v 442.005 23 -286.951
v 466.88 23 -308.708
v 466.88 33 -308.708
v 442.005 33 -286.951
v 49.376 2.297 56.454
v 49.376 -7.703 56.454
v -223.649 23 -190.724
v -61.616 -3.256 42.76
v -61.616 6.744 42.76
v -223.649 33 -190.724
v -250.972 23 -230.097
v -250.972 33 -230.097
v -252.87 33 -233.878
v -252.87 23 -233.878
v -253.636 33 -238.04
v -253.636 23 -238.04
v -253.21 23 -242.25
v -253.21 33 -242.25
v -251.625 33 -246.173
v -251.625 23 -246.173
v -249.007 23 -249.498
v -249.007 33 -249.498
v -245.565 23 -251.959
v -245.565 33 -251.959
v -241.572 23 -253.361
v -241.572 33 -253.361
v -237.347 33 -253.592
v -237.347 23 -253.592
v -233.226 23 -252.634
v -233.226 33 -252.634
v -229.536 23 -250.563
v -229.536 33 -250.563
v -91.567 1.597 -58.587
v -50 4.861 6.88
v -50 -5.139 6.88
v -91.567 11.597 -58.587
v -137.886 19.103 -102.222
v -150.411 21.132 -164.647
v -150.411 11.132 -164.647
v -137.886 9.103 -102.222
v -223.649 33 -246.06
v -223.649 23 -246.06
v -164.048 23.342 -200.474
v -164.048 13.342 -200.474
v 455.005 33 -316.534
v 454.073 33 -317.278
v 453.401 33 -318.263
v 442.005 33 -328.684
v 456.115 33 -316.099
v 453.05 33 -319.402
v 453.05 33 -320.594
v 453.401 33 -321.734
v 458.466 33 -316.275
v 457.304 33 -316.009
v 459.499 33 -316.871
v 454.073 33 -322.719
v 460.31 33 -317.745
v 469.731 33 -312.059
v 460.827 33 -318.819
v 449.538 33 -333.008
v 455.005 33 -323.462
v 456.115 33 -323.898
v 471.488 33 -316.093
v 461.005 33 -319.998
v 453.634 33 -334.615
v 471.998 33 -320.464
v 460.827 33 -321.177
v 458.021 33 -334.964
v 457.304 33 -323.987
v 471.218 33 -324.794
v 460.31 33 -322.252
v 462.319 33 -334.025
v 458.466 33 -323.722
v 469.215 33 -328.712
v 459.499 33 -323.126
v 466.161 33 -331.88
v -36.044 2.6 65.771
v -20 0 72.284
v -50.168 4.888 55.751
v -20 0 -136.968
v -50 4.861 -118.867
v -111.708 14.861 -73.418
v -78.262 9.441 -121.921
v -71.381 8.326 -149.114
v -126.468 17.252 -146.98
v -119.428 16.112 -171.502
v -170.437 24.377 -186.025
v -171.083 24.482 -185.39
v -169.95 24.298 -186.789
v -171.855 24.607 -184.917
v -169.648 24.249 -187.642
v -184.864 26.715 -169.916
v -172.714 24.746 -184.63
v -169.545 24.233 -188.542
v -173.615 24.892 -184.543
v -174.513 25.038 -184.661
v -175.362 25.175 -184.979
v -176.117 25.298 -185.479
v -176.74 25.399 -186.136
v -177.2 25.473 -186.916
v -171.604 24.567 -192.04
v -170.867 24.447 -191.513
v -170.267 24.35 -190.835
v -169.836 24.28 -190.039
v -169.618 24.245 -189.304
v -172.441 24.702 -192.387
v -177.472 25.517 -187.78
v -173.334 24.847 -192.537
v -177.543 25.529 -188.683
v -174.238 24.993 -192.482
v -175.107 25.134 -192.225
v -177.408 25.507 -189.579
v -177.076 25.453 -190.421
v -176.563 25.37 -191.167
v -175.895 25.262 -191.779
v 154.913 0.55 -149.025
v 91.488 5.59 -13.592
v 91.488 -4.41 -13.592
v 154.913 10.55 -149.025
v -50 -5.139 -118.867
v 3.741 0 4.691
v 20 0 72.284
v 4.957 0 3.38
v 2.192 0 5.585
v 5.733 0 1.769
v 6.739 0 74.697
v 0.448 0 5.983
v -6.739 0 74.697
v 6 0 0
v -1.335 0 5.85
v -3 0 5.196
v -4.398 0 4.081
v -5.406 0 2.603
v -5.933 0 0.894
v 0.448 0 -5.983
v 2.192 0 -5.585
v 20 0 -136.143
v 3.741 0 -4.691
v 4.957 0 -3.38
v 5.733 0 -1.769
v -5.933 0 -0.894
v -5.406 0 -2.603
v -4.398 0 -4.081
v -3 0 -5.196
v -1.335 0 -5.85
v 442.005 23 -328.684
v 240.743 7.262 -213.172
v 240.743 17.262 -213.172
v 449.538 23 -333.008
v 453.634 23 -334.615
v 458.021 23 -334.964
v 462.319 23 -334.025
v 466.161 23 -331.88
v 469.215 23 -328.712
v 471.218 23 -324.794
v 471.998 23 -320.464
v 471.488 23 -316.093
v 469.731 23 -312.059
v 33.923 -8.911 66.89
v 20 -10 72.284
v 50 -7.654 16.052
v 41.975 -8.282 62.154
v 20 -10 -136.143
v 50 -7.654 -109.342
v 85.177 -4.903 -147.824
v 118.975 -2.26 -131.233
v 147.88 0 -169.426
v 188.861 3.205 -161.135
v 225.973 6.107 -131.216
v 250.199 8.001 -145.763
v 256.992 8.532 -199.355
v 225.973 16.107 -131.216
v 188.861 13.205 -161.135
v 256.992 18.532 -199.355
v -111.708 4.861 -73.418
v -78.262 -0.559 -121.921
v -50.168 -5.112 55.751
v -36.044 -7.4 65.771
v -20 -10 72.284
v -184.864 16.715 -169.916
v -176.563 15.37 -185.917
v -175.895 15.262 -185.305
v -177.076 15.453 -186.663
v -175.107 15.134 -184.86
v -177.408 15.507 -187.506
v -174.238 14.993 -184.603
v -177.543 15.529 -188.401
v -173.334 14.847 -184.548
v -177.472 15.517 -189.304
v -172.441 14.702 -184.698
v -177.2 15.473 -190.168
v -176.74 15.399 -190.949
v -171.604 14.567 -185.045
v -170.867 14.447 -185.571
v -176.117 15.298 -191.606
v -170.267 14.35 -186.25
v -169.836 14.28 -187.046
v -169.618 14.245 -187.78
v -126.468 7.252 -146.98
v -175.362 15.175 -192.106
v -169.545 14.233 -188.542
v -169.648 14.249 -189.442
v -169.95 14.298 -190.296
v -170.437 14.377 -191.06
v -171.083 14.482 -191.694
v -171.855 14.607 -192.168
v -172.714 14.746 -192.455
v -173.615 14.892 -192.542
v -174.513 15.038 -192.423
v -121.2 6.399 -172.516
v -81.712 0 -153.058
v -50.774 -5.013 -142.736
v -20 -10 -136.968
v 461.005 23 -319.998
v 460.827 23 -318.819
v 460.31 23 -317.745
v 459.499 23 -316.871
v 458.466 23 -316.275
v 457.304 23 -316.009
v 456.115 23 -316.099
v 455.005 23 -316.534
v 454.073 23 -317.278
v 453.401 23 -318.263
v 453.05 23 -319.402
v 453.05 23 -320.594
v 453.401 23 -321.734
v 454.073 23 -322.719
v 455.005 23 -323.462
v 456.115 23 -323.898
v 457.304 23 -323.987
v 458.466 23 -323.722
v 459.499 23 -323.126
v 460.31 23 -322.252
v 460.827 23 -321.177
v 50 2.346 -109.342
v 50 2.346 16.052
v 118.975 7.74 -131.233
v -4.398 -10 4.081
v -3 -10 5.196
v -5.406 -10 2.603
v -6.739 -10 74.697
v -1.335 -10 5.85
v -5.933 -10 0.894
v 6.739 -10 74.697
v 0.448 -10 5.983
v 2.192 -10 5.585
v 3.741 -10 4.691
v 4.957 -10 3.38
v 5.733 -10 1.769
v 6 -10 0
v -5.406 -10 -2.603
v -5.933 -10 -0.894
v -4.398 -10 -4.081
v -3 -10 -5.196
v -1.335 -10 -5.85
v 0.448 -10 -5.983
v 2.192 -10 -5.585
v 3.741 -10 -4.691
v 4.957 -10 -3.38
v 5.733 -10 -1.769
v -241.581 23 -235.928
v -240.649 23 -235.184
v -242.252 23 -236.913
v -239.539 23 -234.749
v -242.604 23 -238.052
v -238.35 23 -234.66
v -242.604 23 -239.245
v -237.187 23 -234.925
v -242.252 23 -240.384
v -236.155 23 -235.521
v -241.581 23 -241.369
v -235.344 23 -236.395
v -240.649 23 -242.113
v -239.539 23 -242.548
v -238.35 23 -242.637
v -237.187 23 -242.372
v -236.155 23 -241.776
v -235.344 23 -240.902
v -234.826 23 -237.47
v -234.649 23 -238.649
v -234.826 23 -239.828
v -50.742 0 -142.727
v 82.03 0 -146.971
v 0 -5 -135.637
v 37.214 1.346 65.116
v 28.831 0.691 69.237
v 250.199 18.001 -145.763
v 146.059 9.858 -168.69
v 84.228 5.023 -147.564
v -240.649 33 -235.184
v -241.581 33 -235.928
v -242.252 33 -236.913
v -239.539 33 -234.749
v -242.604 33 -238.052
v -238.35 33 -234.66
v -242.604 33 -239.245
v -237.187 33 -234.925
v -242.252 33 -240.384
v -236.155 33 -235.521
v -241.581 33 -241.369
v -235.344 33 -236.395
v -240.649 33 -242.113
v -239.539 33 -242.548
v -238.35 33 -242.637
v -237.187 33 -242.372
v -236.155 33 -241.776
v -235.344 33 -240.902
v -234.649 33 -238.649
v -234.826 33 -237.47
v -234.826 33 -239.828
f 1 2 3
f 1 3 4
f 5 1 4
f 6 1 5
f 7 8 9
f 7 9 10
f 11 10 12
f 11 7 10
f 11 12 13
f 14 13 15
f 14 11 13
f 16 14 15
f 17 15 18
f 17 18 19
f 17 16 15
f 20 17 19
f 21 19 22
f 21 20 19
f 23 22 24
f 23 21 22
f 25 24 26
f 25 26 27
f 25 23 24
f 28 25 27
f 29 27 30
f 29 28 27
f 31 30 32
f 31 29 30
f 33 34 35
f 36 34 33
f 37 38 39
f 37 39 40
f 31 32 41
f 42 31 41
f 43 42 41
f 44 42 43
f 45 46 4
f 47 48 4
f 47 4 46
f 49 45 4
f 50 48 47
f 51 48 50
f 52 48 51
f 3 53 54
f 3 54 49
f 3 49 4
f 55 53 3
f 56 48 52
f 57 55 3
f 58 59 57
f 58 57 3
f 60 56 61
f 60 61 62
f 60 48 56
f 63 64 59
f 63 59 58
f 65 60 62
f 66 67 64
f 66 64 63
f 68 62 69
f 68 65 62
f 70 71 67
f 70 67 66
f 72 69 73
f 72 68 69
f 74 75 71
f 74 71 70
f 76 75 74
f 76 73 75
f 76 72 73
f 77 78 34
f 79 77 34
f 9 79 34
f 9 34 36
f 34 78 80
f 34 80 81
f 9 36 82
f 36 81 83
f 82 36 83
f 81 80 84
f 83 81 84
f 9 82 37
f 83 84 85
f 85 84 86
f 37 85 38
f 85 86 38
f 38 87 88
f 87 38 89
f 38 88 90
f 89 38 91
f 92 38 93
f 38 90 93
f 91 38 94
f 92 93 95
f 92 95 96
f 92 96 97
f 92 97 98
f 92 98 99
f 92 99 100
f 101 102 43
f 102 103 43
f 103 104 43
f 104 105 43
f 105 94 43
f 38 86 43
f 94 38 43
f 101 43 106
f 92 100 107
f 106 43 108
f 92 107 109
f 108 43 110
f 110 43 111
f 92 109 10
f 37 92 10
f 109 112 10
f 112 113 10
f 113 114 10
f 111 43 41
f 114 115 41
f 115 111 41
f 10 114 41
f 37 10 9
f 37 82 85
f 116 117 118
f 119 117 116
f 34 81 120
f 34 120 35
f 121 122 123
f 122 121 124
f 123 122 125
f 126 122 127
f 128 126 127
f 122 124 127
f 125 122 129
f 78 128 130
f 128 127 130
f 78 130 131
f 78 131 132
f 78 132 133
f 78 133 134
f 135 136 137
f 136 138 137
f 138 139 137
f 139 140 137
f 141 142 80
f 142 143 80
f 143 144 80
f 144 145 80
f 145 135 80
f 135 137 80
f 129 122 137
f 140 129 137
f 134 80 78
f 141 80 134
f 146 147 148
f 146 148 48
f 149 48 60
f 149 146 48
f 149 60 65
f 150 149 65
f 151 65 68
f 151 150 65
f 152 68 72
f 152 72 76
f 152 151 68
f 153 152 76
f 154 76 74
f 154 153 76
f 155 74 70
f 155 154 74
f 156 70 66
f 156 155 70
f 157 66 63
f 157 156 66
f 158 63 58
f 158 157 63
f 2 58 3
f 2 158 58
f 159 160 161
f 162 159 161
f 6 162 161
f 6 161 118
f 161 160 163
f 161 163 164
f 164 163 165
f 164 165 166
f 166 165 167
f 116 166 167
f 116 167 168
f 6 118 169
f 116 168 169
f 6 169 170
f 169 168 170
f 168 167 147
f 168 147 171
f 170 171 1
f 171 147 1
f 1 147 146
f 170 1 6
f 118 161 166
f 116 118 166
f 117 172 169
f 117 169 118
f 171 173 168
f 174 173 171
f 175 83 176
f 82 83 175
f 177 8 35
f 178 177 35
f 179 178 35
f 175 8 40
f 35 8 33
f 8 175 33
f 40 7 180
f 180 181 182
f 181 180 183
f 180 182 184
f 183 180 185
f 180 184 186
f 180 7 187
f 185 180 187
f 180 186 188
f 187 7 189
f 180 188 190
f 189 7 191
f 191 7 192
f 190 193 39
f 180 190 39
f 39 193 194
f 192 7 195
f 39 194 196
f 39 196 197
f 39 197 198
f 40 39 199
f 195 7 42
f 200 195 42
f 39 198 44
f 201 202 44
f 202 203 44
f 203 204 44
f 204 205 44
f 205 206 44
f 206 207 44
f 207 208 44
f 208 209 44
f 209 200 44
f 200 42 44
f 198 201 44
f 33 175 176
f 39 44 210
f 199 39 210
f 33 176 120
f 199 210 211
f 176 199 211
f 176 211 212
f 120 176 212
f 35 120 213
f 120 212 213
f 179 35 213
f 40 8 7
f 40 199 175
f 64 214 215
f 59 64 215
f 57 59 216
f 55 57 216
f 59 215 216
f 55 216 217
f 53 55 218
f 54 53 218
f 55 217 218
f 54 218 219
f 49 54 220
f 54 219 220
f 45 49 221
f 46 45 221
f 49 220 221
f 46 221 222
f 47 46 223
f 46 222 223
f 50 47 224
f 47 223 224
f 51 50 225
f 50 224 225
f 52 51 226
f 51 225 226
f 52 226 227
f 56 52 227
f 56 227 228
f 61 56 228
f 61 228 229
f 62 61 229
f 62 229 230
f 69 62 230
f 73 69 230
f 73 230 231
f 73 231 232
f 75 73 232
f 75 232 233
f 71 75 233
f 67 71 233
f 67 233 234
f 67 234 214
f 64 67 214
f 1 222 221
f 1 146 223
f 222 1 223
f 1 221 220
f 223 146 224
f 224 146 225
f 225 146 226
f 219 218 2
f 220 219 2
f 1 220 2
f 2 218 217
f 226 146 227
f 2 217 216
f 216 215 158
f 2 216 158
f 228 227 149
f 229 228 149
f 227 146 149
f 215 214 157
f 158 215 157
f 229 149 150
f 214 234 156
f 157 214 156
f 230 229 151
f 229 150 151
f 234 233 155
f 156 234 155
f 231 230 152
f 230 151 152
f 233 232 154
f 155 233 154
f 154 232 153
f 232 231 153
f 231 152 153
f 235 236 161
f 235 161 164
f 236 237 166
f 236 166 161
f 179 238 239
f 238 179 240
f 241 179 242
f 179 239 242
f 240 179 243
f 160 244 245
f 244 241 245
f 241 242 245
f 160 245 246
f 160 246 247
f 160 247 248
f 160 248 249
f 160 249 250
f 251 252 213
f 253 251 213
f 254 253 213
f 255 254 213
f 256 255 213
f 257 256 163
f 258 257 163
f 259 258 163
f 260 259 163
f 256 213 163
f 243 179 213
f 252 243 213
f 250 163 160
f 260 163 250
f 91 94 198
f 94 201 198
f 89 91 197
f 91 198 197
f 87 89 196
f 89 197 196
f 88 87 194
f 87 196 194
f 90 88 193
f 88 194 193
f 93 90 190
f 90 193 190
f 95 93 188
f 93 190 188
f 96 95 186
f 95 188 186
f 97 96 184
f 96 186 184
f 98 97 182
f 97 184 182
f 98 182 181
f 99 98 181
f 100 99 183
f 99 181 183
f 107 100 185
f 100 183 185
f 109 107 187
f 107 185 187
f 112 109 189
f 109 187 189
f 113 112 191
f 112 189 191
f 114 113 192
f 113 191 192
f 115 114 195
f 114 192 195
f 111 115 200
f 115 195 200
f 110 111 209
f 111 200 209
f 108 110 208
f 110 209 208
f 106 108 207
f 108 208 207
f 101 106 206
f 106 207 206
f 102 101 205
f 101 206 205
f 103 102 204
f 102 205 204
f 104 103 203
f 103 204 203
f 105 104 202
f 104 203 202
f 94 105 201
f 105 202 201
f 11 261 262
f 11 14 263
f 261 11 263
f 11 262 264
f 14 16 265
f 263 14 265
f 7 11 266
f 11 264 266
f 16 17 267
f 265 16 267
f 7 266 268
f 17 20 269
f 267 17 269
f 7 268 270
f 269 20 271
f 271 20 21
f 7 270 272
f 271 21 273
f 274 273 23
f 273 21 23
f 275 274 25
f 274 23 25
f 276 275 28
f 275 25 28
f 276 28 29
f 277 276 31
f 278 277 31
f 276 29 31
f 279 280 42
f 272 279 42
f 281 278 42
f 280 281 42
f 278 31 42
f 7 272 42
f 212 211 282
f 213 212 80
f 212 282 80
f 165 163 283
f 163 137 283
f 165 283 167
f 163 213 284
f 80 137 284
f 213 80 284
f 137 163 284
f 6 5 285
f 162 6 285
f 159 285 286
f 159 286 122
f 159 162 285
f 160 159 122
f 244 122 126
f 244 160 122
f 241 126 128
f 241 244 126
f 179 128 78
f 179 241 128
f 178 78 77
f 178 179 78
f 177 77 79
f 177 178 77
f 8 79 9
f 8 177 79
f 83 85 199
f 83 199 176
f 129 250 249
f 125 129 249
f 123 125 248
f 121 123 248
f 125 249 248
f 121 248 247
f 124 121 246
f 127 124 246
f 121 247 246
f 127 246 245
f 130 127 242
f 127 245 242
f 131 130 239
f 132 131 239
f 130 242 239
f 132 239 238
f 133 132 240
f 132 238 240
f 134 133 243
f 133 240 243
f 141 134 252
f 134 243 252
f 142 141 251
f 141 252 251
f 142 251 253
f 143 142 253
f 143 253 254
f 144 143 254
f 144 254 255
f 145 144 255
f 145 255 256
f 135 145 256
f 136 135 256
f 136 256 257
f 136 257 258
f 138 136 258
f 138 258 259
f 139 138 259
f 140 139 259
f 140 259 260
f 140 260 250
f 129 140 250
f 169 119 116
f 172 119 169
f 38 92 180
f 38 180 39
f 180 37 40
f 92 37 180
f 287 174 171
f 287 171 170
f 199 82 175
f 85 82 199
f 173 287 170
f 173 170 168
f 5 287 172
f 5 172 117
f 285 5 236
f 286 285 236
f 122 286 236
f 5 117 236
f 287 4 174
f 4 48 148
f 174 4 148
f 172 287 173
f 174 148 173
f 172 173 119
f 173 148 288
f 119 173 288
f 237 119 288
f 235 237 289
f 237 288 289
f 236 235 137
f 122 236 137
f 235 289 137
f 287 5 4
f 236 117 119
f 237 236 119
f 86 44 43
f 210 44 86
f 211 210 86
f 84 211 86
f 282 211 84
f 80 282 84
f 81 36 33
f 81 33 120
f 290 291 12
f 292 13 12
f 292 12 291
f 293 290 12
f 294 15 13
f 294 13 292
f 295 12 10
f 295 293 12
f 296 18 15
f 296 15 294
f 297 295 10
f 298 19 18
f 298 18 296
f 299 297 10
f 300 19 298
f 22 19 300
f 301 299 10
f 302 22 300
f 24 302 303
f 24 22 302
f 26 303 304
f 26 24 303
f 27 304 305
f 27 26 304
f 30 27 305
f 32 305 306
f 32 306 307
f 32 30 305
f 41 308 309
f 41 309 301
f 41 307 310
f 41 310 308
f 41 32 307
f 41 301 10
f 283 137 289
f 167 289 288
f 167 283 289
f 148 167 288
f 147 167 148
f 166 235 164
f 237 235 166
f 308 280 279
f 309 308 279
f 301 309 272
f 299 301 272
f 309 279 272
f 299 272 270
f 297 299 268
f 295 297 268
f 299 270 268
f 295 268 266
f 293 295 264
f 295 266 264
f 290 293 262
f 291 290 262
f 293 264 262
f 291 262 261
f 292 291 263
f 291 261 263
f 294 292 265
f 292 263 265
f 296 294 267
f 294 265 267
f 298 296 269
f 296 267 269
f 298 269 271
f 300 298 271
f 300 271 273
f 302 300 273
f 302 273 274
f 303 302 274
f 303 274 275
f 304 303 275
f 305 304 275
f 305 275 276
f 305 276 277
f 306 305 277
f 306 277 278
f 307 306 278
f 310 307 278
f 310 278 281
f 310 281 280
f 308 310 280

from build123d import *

# Parameters (mm, degrees)
F1_W     = 30
F1_H     = 10
F2_DEPTH = 340
F3_DEPTH = 100
F5_DEPTH = 76
F6_R     = 4
F6_R_2   = 6
F7_DEPTH = 66


with BuildPart() as f2:
    # F1 (on Top) → F2 (new body)
    with BuildSketch(Plane.XY):
        Polygon((0, 0), (-20, 0), (-20, -10), (20, -10), (20, 0), align=None)
        Polygon((-20, -10), (-20, 0), (-223.64854, 33), (-223.64854, 23), align=None)
        with Locations((-238.64854, 28)):
            Rectangle(F1_W, F1_H)
        Polygon((442.00493, 33), (20, 0), (20, -10), (442.00493, 23), align=None)
        with Locations((457.00493, 28)):
            Rectangle(F1_W, F1_H)
    extrude(amount=-F2_DEPTH)

    # F1 (on Top) → F3 (join)
    with BuildSketch(Plane.XY):
        Polygon((0, 0), (-20, 0), (-20, -10), (20, -10), (20, 0), align=None)
        Polygon((-20, -10), (-20, 0), (-223.64854, 33), (-223.64854, 23), align=None)
        with Locations((-238.64854, 28)):
            Rectangle(F1_W, F1_H)
        Polygon((442.00493, 33), (20, 0), (20, -10), (442.00493, 23), align=None)
        with Locations((457.00493, 28)):
            Rectangle(F1_W, F1_H)
    extrude(amount=F3_DEPTH)

    # F4 (on Front) → F5 (intersect, symmetric)
    with BuildSketch(Plane.XZ):
        with BuildLine():
            ThreePointArc((-250.9718022583, -230.0965111685), (-249.006915225, -249.4976876834), (-229.5356153331, -250.563010045))
            ThreePointArc((-229.5356153331, -250.563010045), (-225.2006047987, -245.2933166844), (-223.6485386505, -238.6485386505))
            ThreePointArc((-223.6485386505, -238.6485386505), (-234.1679669301, -224.3333552056), (-250.9718022583, -230.0965111685))
        make_face()
        with BuildLine():
            add(Edge.make_bspline(
                [(-229.5356153331, -250.563010045), (-208.7207010553, -234.6424785008), (-187.0701685552, -217.0301430269), (-164.0481391717, -200.4741451059)],
                knots=[0, 0, 0, 0, 0.1373195068, 0.1373195068, 0.1373195068, 0.1373195068], degree=3))
            Line((-229.5356153331, -250.563010045), (-164.0481391717, -200.4741451059))
        make_face()
        with BuildLine():
            ThreePointArc((-223.6485386505, -238.6485386505), (-225.2006047987, -245.2933166844), (-229.5356153331, -250.563010045))
            add(Edge.make_bspline(
                [(-229.5356153331, -250.563010045), (-208.7207010553, -234.6424785008), (-187.0701685552, -217.0301430269), (-164.0481391717, -200.4741451059)],
                knots=[0, 0, 0, 0, 0.1373195068, 0.1373195068, 0.1373195068, 0.1373195068], degree=3))
            Line((-164.0481391717, -200.4741451059), (0, -75))
            ThreePointArc((0, -75), (-66.4530293795, -34.7706037666), (-61.6163187638, 42.7601363655))
            Line((-61.6163187638, 42.7601363655), (-250.9718022583, -230.0965111685))
            ThreePointArc((-250.9718022583, -230.0965111685), (-234.1679669301, -224.3333552056), (-223.6485386505, -238.6485386505))
        make_face()
        with BuildLine():
            Line((0, -75), (-164.0481391717, -200.4741451059))
            add(Edge.make_bspline(
                [(-164.0481391717, -200.4741451059), (-116.7152354778, -166.4352929221), (-4.1014041633, -103.751655246), (155.4809175381, -168.4276528716), (240.7432263876, -213.1721002441)],
                knots=[0.1373195068, 0.1373195068, 0.1373195068, 0.1373195068, 0.4196460942, 0.7357326781, 0.7357326781, 0.7357326781, 0.7357326781], degree=3))
            Line((240.7432263876, -213.1721002441), (0, -75))
        make_face()
        with BuildLine():
            ThreePointArc((49.3759786376, 56.4536334843), (-9.1833788682, 74.4356470555), (-61.6163187638, 42.7601363655))
            ThreePointArc((-61.6163187638, 42.7601363655), (-66.4530293795, -34.7706037666), (0, -75))
            ThreePointArc((0, -75), (53.033008589, -53.033008589), (75, 0))
            ThreePointArc((75, 0), (68.2942105812, 30.9983999763), (49.3759786376, 56.4536334843))
        make_face()
        with BuildLine():
            ThreePointArc((75, 0), (53.033008589, -53.033008589), (0, -75))
            Line((0, -75), (240.7432263876, -213.1721002441))
            add(Edge.make_bspline(
                [(240.7432263876, -213.1721002441), (312.0276249141, -250.5811390256), (383.9898125383, -295.3870059685), (449.5382273905, -333.0078449167)],
                knots=[0.7357326781, 0.7357326781, 0.7357326781, 0.7357326781, 1, 1, 1, 1], degree=3))
            ThreePointArc((449.5382273905, -333.0078449167), (444.7952538382, -311.2848606652), (466.8801220688, -308.7075678715))
            Line((466.8801220688, -308.7075678715), (49.3759786376, 56.4536334843))
            ThreePointArc((49.3759786376, 56.4536334843), (68.2942105812, 30.9983999763), (75, 0))
        make_face()
        with BuildLine():
            add(Edge.make_bspline(
                [(240.7432263876, -213.1721002441), (312.0276249141, -250.5811390256), (383.9898125383, -295.3870059685), (449.5382273905, -333.0078449167)],
                knots=[0.7357326781, 0.7357326781, 0.7357326781, 0.7357326781, 1, 1, 1, 1], degree=3))
            Line((240.7432263876, -213.1721002441), (449.5382273905, -333.0078449167))
        make_face()
        with BuildLine():
            ThreePointArc((466.8801220688, -308.7075678715), (444.7952538382, -311.2848606652), (449.5382273905, -333.0078449167))
            ThreePointArc((449.5382273905, -333.0078449167), (464.521558007, -332.979057912), (472.0049255088, -319.9982938402))
            ThreePointArc((472.0049255088, -319.9982938402), (470.6637678536, -313.7986143485), (466.8801220688, -308.7075678715))
        make_face()
    extrude(amount=F5_DEPTH, both=True, mode=Mode.INTERSECT)

    # F6 (on face) → F7 (cut, symmetric)
    with BuildSketch(Plane.XZ.offset(10)):
        Polygon((-50, -118.8666767037), (-50, 6.8798678522), (-91.5673471808, -58.5868135927), align=None)
        Polygon((-126.4676634488, -146.9804479722), (-78.2616292159, -121.9207695), (-111.7079214913, -73.417844568), align=None)
        Polygon((-150.4108945671, -164.6469025725), (-137.8857839916, -102.2217094685), (-184.8640607304, -169.9162639715), align=None)
        Polygon((50, 16.0521292518), (50, -109.3419641256), (118.974648416, -131.2328726053), align=None)
        Polygon((225.9725652657, -131.215947327), (91.4881845235, -13.5920175816), (154.9125586599, -149.0252423531), align=None)
        Polygon((250.1992884028, -145.7627206944), (188.8613105429, -161.1354485647), (256.9922346805, -199.3553946004), align=None)
        with Locations((-238.6485386505, -238.6485386505)):
            Circle(F6_R)
        with Locations((457.0049255088, -319.9982938402)):
            Circle(F6_R)
        Circle(F6_R_2)
        with Locations((-173.5450253277, -188.5422087565)):
            Circle(F6_R)
    extrude(amount=F7_DEPTH, both=True, mode=Mode.SUBTRACT)


solid = f2.part
